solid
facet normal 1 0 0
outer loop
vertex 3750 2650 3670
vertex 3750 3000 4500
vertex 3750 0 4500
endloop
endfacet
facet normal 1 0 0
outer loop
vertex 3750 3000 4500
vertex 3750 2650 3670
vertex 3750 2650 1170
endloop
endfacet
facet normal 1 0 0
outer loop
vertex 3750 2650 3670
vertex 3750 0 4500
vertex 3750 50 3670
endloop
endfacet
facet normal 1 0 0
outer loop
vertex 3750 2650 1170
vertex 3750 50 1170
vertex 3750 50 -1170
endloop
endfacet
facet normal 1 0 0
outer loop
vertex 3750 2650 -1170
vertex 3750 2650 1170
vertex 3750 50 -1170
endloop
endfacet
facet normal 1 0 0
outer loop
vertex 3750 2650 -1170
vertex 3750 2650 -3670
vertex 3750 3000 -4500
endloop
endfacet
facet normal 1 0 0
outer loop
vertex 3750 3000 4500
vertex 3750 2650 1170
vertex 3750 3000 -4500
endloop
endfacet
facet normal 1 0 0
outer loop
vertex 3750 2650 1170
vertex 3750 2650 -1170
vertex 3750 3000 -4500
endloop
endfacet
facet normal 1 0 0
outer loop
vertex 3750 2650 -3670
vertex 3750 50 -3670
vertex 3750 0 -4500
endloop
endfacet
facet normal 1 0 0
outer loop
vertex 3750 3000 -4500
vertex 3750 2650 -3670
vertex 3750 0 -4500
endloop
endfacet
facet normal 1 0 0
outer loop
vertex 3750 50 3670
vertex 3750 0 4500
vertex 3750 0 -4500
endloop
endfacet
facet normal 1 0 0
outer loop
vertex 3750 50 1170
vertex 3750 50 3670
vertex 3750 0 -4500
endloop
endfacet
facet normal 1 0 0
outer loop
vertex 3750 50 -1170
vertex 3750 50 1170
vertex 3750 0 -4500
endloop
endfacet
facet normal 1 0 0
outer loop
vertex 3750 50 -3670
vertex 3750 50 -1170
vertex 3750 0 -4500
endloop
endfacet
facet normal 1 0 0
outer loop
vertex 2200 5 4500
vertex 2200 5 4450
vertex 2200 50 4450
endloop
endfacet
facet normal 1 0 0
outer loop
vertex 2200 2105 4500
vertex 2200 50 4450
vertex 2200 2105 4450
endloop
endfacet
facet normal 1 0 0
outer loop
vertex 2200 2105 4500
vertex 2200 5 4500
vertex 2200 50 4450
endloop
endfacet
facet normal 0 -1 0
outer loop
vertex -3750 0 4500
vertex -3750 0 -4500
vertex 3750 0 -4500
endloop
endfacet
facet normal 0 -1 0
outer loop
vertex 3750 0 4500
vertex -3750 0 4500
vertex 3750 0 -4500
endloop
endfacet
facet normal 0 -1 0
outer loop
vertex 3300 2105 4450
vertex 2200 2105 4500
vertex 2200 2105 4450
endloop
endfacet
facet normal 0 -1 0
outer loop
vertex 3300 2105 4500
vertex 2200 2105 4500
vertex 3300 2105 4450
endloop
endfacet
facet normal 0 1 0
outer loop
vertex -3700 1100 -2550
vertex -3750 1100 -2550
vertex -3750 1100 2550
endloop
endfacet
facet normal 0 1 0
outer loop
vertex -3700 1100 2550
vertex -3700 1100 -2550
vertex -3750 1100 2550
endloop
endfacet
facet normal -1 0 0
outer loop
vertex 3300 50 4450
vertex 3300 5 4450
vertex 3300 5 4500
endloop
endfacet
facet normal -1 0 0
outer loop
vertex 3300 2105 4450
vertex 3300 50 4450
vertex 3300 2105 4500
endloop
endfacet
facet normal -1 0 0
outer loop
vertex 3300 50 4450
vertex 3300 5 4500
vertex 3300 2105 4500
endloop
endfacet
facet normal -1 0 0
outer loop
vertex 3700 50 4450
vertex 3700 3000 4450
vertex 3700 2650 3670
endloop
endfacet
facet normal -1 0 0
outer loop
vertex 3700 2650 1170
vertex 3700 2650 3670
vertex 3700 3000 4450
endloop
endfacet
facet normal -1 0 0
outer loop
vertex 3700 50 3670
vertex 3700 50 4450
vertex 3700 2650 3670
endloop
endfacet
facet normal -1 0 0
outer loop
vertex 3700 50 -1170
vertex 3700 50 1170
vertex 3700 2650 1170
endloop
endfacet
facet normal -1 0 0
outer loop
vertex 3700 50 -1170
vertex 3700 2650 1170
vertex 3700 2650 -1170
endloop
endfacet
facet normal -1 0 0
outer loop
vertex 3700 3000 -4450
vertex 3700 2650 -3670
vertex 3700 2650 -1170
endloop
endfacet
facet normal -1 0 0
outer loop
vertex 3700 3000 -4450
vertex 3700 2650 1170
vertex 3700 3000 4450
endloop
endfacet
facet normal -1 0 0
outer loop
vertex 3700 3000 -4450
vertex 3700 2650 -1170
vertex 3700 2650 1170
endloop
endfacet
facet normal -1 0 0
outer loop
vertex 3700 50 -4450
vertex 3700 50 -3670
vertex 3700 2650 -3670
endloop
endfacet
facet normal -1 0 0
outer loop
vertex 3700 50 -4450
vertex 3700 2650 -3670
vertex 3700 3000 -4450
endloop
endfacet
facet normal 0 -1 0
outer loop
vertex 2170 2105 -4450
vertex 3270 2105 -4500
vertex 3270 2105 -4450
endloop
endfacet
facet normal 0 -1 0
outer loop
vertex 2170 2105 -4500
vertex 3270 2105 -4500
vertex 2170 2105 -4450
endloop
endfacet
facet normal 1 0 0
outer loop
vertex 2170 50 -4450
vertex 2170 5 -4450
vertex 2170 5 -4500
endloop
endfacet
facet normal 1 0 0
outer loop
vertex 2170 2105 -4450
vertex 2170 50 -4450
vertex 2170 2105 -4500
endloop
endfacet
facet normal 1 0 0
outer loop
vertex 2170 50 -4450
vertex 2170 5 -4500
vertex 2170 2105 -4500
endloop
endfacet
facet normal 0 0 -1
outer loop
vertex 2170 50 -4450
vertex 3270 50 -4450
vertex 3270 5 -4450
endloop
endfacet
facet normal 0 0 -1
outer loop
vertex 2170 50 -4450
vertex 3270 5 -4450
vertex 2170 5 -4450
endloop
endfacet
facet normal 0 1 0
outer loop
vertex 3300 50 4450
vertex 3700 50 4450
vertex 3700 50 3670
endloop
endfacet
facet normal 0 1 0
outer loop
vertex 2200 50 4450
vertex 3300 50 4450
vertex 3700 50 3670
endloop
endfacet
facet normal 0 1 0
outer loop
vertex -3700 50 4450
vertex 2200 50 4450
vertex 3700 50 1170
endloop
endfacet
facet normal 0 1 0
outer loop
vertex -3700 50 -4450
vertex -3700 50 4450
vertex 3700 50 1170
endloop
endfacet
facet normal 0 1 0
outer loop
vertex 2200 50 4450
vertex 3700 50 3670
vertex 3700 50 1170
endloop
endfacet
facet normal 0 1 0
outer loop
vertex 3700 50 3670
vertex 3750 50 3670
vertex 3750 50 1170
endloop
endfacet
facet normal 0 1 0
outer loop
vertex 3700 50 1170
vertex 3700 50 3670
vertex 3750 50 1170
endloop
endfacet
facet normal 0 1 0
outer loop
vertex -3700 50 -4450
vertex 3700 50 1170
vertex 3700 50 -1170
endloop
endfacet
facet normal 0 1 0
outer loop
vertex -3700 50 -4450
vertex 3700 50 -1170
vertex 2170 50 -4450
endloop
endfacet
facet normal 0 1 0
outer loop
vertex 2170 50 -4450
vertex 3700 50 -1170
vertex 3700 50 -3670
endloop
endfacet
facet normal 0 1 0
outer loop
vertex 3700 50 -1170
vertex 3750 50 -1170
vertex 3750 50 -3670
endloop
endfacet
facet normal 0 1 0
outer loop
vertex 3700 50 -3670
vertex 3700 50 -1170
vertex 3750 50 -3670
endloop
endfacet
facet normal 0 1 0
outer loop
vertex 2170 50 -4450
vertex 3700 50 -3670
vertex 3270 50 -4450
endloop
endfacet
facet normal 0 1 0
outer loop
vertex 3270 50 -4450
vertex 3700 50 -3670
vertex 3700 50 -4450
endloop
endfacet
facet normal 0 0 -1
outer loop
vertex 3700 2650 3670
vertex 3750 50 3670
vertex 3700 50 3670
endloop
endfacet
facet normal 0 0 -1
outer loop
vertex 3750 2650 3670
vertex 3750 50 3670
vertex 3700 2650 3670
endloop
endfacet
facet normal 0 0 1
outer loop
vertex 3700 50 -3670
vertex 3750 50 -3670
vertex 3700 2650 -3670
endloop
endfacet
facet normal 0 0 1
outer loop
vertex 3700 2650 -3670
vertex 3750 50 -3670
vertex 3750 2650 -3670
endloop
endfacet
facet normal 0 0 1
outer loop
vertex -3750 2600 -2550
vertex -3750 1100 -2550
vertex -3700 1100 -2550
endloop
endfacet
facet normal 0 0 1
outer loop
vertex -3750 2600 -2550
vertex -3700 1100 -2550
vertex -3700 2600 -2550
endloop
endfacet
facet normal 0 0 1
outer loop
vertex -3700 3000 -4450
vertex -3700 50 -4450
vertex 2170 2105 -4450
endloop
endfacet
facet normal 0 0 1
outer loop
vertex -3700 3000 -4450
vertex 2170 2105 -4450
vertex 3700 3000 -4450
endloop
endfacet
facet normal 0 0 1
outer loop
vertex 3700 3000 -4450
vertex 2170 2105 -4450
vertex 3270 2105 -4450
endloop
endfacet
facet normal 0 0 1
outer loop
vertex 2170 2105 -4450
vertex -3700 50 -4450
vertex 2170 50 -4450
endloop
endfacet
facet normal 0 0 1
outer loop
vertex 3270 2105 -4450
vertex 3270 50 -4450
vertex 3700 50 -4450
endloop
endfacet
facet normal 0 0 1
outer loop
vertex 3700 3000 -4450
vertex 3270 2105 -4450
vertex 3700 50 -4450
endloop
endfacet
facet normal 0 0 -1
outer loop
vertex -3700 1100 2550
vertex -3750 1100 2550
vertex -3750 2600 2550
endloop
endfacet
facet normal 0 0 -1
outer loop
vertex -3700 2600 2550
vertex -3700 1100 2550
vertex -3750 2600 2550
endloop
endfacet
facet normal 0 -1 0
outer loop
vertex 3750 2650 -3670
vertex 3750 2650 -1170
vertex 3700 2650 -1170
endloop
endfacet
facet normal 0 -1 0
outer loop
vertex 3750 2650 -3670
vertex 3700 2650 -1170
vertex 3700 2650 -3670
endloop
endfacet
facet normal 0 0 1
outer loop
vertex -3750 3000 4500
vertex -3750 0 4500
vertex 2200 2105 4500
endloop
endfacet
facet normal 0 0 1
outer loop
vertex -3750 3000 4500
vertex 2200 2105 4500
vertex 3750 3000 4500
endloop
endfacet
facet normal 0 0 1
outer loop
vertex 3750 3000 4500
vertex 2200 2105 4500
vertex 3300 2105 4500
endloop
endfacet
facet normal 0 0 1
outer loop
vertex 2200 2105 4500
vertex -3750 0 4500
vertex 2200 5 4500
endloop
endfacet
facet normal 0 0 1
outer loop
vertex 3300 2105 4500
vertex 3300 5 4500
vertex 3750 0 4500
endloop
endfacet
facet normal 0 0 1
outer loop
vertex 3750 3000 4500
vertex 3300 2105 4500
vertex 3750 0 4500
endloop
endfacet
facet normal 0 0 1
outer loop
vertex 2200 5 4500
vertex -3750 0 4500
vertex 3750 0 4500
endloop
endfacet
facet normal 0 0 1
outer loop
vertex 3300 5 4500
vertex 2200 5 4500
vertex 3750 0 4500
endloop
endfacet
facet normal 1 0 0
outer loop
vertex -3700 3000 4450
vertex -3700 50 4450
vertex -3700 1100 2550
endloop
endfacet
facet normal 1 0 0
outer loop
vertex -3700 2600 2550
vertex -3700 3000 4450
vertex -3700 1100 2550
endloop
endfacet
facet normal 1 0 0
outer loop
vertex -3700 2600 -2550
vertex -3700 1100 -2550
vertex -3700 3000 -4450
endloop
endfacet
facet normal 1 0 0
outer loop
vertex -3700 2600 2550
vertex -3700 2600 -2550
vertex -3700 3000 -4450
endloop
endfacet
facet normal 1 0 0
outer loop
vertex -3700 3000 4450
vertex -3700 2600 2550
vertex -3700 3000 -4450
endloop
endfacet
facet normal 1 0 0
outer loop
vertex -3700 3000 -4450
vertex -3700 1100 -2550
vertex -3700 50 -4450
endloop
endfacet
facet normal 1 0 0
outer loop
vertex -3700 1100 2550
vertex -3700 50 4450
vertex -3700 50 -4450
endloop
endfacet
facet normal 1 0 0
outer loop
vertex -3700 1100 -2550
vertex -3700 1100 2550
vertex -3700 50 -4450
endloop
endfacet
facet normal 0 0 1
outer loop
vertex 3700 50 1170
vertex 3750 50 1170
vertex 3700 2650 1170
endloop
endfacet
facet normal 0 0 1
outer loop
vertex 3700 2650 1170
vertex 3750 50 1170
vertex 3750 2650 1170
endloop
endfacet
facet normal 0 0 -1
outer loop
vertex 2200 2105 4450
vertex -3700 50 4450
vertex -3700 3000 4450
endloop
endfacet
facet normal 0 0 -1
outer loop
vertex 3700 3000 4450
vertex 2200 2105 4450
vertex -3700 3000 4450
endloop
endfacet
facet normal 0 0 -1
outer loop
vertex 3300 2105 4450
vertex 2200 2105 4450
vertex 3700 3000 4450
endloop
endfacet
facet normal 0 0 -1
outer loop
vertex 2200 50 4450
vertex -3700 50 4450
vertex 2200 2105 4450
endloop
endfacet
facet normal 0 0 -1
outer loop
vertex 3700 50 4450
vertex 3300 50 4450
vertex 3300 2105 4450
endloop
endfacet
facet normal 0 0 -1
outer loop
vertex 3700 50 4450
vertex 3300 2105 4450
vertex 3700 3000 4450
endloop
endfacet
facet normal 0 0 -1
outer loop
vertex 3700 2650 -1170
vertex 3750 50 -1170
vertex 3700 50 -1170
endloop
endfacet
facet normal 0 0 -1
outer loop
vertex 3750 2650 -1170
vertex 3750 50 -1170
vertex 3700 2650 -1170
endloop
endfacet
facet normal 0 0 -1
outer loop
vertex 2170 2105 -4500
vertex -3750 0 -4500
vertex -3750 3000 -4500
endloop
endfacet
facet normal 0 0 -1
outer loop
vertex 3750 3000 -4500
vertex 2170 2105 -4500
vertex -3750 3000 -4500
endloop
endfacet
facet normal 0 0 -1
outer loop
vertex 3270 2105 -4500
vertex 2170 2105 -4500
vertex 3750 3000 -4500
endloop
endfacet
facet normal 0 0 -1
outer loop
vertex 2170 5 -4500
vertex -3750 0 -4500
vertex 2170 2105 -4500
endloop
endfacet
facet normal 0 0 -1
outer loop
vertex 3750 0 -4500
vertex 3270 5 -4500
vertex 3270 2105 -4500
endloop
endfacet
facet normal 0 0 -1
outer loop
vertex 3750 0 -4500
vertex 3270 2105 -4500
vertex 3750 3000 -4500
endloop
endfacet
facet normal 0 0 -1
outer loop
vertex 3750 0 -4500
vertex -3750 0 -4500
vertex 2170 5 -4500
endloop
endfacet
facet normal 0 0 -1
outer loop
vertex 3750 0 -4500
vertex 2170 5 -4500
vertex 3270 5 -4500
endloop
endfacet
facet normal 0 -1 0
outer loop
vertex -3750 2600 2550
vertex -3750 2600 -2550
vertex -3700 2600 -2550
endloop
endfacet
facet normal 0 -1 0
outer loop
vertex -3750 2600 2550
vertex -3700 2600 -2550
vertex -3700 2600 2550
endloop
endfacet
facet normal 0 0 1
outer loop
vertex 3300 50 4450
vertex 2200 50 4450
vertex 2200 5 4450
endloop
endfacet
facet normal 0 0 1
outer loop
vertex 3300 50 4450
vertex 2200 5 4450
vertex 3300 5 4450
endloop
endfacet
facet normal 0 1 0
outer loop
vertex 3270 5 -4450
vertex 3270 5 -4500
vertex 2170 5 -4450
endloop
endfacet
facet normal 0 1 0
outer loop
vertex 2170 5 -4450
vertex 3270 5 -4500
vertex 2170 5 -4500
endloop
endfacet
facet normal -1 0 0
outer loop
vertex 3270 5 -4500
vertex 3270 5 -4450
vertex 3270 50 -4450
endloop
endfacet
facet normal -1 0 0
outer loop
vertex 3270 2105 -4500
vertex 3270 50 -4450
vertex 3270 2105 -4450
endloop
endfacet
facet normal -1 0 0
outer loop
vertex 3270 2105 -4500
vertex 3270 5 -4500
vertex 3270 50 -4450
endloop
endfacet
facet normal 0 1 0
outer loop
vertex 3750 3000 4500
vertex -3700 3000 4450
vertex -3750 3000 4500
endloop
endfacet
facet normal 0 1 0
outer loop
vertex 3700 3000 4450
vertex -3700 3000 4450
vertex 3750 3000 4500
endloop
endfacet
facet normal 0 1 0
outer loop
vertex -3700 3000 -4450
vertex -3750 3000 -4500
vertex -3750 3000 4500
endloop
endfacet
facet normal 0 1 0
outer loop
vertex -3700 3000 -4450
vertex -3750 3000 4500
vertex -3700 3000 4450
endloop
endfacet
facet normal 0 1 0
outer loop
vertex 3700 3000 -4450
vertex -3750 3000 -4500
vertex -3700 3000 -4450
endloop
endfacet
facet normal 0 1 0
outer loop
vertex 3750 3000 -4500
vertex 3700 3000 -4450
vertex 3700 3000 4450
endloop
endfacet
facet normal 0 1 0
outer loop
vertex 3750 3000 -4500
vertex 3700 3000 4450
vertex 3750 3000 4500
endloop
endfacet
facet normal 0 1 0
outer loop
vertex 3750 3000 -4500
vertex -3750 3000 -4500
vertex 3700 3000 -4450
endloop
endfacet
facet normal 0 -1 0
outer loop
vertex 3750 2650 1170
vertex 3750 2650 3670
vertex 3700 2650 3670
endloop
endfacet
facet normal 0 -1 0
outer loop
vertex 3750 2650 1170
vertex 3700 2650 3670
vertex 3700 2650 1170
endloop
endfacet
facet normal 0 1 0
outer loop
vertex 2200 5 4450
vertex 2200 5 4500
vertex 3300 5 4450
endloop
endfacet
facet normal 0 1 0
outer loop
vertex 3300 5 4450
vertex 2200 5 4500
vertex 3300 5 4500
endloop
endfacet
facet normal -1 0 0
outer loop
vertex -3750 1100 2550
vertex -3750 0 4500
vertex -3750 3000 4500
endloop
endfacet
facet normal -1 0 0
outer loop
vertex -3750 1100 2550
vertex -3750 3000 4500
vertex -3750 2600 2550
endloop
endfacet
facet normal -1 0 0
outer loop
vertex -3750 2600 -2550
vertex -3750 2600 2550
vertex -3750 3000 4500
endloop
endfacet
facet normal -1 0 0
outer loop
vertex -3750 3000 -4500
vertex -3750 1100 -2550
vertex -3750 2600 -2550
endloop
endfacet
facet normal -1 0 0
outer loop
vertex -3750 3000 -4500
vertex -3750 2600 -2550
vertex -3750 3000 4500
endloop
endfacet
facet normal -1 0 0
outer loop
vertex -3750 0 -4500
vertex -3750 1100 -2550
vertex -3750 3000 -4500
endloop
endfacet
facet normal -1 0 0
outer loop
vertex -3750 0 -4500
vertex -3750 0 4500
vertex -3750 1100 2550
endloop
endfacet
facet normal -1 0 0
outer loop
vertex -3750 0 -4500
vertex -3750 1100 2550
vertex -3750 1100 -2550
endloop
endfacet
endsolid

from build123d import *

# Parameters (mm, degrees)
SKETCH1_W           = 7500
SKETCH1_H           = 9000
BOSS_EXTRUDE1_DEPTH = 3000
SHELL1_T            = -50
CUT_EXTRUDE2_REACH  = 9248.621
SKETCH2_W           = 2500
SKETCH2_H           = 2600
SKETCH3_W           = 2500
SKETCH3_H           = 2600
CUT_EXTRUDE3_DEPTH  = 3000
SKETCH4_W           = 1100
SKETCH4_H           = 2100
CUT_EXTRUDE4_DEPTH  = 50
SKETCH6_W           = 1100
SKETCH6_H           = 2100
CUT_EXTRUDE5_DEPTH  = 50
SKETCH7_W           = 5100
SKETCH7_H           = 1500
CUT_EXTRUDE6_DEPTH  = 50


with BuildPart() as part:
    # Sketch1 → Boss-Extrude1 (new body)
    with BuildSketch(Plane(origin=(0, 0, 0), x_dir=(1, 0, 0), z_dir=(0, 1, 0))):
        Rectangle(SKETCH1_W, SKETCH1_H)
    extrude(amount=BOSS_EXTRUDE1_DEPTH)

    # Shell1
    shell1_openings = [part.faces().sort_by_distance(p)[0] for p in [
        (0, 3000, 0),
    ]]
    offset(amount=SHELL1_T, openings=shell1_openings, kind=Kind.INTERSECTION)

    # Sketch2 → Cut-Extrude2 (cut, up to next)
    with BuildSketch(Plane(origin=(3750, 0, 0), x_dir=(0, 0, -1), z_dir=(1, 0, 0)), mode=Mode.PRIVATE) as cut_extrude2_sk1:
        with Locations((2420, 1350)):
            Rectangle(SKETCH2_W, SKETCH2_H)
    cut_extrude2_tool1 = extrude(cut_extrude2_sk1.sketch, amount=-CUT_EXTRUDE2_REACH, mode=Mode.PRIVATE) & part.part
    add(cut_extrude2_tool1.solids().sort_by_distance((3750, 1350, -2420))[0], mode=Mode.SUBTRACT)

    # Sketch3 → Cut-Extrude3 (cut)
    with BuildSketch(Plane(origin=(3750, 0, 0), x_dir=(0, 0, -1), z_dir=(1, 0, 0))):
        with Locations((-2420, 1350)):
            Rectangle(SKETCH3_W, SKETCH3_H)
    extrude(amount=-CUT_EXTRUDE3_DEPTH, mode=Mode.SUBTRACT)

    # Sketch4 → Cut-Extrude4 (cut)
    with BuildSketch(Plane.XY.offset(4500)):
        with Locations((2750, 1055)):
            Rectangle(SKETCH4_W, SKETCH4_H)
    extrude(amount=-CUT_EXTRUDE4_DEPTH, mode=Mode.SUBTRACT)

    # Sketch6 → Cut-Extrude5 (cut)
    with BuildSketch(Plane(origin=(0, 0, -4500), x_dir=(-1, 0, 0), z_dir=(0, 0, -1))):
        with Locations((-2720, 1055)):
            Rectangle(SKETCH6_W, SKETCH6_H)
    extrude(amount=-CUT_EXTRUDE5_DEPTH, mode=Mode.SUBTRACT)

    # Sketch7 → Cut-Extrude6 (cut)
    with BuildSketch(Plane.ZY.offset(3750)):
        with Locations((0, 1850)):
            Rectangle(SKETCH7_W, SKETCH7_H)
    extrude(amount=-CUT_EXTRUDE6_DEPTH, mode=Mode.SUBTRACT)


solid = part.part
